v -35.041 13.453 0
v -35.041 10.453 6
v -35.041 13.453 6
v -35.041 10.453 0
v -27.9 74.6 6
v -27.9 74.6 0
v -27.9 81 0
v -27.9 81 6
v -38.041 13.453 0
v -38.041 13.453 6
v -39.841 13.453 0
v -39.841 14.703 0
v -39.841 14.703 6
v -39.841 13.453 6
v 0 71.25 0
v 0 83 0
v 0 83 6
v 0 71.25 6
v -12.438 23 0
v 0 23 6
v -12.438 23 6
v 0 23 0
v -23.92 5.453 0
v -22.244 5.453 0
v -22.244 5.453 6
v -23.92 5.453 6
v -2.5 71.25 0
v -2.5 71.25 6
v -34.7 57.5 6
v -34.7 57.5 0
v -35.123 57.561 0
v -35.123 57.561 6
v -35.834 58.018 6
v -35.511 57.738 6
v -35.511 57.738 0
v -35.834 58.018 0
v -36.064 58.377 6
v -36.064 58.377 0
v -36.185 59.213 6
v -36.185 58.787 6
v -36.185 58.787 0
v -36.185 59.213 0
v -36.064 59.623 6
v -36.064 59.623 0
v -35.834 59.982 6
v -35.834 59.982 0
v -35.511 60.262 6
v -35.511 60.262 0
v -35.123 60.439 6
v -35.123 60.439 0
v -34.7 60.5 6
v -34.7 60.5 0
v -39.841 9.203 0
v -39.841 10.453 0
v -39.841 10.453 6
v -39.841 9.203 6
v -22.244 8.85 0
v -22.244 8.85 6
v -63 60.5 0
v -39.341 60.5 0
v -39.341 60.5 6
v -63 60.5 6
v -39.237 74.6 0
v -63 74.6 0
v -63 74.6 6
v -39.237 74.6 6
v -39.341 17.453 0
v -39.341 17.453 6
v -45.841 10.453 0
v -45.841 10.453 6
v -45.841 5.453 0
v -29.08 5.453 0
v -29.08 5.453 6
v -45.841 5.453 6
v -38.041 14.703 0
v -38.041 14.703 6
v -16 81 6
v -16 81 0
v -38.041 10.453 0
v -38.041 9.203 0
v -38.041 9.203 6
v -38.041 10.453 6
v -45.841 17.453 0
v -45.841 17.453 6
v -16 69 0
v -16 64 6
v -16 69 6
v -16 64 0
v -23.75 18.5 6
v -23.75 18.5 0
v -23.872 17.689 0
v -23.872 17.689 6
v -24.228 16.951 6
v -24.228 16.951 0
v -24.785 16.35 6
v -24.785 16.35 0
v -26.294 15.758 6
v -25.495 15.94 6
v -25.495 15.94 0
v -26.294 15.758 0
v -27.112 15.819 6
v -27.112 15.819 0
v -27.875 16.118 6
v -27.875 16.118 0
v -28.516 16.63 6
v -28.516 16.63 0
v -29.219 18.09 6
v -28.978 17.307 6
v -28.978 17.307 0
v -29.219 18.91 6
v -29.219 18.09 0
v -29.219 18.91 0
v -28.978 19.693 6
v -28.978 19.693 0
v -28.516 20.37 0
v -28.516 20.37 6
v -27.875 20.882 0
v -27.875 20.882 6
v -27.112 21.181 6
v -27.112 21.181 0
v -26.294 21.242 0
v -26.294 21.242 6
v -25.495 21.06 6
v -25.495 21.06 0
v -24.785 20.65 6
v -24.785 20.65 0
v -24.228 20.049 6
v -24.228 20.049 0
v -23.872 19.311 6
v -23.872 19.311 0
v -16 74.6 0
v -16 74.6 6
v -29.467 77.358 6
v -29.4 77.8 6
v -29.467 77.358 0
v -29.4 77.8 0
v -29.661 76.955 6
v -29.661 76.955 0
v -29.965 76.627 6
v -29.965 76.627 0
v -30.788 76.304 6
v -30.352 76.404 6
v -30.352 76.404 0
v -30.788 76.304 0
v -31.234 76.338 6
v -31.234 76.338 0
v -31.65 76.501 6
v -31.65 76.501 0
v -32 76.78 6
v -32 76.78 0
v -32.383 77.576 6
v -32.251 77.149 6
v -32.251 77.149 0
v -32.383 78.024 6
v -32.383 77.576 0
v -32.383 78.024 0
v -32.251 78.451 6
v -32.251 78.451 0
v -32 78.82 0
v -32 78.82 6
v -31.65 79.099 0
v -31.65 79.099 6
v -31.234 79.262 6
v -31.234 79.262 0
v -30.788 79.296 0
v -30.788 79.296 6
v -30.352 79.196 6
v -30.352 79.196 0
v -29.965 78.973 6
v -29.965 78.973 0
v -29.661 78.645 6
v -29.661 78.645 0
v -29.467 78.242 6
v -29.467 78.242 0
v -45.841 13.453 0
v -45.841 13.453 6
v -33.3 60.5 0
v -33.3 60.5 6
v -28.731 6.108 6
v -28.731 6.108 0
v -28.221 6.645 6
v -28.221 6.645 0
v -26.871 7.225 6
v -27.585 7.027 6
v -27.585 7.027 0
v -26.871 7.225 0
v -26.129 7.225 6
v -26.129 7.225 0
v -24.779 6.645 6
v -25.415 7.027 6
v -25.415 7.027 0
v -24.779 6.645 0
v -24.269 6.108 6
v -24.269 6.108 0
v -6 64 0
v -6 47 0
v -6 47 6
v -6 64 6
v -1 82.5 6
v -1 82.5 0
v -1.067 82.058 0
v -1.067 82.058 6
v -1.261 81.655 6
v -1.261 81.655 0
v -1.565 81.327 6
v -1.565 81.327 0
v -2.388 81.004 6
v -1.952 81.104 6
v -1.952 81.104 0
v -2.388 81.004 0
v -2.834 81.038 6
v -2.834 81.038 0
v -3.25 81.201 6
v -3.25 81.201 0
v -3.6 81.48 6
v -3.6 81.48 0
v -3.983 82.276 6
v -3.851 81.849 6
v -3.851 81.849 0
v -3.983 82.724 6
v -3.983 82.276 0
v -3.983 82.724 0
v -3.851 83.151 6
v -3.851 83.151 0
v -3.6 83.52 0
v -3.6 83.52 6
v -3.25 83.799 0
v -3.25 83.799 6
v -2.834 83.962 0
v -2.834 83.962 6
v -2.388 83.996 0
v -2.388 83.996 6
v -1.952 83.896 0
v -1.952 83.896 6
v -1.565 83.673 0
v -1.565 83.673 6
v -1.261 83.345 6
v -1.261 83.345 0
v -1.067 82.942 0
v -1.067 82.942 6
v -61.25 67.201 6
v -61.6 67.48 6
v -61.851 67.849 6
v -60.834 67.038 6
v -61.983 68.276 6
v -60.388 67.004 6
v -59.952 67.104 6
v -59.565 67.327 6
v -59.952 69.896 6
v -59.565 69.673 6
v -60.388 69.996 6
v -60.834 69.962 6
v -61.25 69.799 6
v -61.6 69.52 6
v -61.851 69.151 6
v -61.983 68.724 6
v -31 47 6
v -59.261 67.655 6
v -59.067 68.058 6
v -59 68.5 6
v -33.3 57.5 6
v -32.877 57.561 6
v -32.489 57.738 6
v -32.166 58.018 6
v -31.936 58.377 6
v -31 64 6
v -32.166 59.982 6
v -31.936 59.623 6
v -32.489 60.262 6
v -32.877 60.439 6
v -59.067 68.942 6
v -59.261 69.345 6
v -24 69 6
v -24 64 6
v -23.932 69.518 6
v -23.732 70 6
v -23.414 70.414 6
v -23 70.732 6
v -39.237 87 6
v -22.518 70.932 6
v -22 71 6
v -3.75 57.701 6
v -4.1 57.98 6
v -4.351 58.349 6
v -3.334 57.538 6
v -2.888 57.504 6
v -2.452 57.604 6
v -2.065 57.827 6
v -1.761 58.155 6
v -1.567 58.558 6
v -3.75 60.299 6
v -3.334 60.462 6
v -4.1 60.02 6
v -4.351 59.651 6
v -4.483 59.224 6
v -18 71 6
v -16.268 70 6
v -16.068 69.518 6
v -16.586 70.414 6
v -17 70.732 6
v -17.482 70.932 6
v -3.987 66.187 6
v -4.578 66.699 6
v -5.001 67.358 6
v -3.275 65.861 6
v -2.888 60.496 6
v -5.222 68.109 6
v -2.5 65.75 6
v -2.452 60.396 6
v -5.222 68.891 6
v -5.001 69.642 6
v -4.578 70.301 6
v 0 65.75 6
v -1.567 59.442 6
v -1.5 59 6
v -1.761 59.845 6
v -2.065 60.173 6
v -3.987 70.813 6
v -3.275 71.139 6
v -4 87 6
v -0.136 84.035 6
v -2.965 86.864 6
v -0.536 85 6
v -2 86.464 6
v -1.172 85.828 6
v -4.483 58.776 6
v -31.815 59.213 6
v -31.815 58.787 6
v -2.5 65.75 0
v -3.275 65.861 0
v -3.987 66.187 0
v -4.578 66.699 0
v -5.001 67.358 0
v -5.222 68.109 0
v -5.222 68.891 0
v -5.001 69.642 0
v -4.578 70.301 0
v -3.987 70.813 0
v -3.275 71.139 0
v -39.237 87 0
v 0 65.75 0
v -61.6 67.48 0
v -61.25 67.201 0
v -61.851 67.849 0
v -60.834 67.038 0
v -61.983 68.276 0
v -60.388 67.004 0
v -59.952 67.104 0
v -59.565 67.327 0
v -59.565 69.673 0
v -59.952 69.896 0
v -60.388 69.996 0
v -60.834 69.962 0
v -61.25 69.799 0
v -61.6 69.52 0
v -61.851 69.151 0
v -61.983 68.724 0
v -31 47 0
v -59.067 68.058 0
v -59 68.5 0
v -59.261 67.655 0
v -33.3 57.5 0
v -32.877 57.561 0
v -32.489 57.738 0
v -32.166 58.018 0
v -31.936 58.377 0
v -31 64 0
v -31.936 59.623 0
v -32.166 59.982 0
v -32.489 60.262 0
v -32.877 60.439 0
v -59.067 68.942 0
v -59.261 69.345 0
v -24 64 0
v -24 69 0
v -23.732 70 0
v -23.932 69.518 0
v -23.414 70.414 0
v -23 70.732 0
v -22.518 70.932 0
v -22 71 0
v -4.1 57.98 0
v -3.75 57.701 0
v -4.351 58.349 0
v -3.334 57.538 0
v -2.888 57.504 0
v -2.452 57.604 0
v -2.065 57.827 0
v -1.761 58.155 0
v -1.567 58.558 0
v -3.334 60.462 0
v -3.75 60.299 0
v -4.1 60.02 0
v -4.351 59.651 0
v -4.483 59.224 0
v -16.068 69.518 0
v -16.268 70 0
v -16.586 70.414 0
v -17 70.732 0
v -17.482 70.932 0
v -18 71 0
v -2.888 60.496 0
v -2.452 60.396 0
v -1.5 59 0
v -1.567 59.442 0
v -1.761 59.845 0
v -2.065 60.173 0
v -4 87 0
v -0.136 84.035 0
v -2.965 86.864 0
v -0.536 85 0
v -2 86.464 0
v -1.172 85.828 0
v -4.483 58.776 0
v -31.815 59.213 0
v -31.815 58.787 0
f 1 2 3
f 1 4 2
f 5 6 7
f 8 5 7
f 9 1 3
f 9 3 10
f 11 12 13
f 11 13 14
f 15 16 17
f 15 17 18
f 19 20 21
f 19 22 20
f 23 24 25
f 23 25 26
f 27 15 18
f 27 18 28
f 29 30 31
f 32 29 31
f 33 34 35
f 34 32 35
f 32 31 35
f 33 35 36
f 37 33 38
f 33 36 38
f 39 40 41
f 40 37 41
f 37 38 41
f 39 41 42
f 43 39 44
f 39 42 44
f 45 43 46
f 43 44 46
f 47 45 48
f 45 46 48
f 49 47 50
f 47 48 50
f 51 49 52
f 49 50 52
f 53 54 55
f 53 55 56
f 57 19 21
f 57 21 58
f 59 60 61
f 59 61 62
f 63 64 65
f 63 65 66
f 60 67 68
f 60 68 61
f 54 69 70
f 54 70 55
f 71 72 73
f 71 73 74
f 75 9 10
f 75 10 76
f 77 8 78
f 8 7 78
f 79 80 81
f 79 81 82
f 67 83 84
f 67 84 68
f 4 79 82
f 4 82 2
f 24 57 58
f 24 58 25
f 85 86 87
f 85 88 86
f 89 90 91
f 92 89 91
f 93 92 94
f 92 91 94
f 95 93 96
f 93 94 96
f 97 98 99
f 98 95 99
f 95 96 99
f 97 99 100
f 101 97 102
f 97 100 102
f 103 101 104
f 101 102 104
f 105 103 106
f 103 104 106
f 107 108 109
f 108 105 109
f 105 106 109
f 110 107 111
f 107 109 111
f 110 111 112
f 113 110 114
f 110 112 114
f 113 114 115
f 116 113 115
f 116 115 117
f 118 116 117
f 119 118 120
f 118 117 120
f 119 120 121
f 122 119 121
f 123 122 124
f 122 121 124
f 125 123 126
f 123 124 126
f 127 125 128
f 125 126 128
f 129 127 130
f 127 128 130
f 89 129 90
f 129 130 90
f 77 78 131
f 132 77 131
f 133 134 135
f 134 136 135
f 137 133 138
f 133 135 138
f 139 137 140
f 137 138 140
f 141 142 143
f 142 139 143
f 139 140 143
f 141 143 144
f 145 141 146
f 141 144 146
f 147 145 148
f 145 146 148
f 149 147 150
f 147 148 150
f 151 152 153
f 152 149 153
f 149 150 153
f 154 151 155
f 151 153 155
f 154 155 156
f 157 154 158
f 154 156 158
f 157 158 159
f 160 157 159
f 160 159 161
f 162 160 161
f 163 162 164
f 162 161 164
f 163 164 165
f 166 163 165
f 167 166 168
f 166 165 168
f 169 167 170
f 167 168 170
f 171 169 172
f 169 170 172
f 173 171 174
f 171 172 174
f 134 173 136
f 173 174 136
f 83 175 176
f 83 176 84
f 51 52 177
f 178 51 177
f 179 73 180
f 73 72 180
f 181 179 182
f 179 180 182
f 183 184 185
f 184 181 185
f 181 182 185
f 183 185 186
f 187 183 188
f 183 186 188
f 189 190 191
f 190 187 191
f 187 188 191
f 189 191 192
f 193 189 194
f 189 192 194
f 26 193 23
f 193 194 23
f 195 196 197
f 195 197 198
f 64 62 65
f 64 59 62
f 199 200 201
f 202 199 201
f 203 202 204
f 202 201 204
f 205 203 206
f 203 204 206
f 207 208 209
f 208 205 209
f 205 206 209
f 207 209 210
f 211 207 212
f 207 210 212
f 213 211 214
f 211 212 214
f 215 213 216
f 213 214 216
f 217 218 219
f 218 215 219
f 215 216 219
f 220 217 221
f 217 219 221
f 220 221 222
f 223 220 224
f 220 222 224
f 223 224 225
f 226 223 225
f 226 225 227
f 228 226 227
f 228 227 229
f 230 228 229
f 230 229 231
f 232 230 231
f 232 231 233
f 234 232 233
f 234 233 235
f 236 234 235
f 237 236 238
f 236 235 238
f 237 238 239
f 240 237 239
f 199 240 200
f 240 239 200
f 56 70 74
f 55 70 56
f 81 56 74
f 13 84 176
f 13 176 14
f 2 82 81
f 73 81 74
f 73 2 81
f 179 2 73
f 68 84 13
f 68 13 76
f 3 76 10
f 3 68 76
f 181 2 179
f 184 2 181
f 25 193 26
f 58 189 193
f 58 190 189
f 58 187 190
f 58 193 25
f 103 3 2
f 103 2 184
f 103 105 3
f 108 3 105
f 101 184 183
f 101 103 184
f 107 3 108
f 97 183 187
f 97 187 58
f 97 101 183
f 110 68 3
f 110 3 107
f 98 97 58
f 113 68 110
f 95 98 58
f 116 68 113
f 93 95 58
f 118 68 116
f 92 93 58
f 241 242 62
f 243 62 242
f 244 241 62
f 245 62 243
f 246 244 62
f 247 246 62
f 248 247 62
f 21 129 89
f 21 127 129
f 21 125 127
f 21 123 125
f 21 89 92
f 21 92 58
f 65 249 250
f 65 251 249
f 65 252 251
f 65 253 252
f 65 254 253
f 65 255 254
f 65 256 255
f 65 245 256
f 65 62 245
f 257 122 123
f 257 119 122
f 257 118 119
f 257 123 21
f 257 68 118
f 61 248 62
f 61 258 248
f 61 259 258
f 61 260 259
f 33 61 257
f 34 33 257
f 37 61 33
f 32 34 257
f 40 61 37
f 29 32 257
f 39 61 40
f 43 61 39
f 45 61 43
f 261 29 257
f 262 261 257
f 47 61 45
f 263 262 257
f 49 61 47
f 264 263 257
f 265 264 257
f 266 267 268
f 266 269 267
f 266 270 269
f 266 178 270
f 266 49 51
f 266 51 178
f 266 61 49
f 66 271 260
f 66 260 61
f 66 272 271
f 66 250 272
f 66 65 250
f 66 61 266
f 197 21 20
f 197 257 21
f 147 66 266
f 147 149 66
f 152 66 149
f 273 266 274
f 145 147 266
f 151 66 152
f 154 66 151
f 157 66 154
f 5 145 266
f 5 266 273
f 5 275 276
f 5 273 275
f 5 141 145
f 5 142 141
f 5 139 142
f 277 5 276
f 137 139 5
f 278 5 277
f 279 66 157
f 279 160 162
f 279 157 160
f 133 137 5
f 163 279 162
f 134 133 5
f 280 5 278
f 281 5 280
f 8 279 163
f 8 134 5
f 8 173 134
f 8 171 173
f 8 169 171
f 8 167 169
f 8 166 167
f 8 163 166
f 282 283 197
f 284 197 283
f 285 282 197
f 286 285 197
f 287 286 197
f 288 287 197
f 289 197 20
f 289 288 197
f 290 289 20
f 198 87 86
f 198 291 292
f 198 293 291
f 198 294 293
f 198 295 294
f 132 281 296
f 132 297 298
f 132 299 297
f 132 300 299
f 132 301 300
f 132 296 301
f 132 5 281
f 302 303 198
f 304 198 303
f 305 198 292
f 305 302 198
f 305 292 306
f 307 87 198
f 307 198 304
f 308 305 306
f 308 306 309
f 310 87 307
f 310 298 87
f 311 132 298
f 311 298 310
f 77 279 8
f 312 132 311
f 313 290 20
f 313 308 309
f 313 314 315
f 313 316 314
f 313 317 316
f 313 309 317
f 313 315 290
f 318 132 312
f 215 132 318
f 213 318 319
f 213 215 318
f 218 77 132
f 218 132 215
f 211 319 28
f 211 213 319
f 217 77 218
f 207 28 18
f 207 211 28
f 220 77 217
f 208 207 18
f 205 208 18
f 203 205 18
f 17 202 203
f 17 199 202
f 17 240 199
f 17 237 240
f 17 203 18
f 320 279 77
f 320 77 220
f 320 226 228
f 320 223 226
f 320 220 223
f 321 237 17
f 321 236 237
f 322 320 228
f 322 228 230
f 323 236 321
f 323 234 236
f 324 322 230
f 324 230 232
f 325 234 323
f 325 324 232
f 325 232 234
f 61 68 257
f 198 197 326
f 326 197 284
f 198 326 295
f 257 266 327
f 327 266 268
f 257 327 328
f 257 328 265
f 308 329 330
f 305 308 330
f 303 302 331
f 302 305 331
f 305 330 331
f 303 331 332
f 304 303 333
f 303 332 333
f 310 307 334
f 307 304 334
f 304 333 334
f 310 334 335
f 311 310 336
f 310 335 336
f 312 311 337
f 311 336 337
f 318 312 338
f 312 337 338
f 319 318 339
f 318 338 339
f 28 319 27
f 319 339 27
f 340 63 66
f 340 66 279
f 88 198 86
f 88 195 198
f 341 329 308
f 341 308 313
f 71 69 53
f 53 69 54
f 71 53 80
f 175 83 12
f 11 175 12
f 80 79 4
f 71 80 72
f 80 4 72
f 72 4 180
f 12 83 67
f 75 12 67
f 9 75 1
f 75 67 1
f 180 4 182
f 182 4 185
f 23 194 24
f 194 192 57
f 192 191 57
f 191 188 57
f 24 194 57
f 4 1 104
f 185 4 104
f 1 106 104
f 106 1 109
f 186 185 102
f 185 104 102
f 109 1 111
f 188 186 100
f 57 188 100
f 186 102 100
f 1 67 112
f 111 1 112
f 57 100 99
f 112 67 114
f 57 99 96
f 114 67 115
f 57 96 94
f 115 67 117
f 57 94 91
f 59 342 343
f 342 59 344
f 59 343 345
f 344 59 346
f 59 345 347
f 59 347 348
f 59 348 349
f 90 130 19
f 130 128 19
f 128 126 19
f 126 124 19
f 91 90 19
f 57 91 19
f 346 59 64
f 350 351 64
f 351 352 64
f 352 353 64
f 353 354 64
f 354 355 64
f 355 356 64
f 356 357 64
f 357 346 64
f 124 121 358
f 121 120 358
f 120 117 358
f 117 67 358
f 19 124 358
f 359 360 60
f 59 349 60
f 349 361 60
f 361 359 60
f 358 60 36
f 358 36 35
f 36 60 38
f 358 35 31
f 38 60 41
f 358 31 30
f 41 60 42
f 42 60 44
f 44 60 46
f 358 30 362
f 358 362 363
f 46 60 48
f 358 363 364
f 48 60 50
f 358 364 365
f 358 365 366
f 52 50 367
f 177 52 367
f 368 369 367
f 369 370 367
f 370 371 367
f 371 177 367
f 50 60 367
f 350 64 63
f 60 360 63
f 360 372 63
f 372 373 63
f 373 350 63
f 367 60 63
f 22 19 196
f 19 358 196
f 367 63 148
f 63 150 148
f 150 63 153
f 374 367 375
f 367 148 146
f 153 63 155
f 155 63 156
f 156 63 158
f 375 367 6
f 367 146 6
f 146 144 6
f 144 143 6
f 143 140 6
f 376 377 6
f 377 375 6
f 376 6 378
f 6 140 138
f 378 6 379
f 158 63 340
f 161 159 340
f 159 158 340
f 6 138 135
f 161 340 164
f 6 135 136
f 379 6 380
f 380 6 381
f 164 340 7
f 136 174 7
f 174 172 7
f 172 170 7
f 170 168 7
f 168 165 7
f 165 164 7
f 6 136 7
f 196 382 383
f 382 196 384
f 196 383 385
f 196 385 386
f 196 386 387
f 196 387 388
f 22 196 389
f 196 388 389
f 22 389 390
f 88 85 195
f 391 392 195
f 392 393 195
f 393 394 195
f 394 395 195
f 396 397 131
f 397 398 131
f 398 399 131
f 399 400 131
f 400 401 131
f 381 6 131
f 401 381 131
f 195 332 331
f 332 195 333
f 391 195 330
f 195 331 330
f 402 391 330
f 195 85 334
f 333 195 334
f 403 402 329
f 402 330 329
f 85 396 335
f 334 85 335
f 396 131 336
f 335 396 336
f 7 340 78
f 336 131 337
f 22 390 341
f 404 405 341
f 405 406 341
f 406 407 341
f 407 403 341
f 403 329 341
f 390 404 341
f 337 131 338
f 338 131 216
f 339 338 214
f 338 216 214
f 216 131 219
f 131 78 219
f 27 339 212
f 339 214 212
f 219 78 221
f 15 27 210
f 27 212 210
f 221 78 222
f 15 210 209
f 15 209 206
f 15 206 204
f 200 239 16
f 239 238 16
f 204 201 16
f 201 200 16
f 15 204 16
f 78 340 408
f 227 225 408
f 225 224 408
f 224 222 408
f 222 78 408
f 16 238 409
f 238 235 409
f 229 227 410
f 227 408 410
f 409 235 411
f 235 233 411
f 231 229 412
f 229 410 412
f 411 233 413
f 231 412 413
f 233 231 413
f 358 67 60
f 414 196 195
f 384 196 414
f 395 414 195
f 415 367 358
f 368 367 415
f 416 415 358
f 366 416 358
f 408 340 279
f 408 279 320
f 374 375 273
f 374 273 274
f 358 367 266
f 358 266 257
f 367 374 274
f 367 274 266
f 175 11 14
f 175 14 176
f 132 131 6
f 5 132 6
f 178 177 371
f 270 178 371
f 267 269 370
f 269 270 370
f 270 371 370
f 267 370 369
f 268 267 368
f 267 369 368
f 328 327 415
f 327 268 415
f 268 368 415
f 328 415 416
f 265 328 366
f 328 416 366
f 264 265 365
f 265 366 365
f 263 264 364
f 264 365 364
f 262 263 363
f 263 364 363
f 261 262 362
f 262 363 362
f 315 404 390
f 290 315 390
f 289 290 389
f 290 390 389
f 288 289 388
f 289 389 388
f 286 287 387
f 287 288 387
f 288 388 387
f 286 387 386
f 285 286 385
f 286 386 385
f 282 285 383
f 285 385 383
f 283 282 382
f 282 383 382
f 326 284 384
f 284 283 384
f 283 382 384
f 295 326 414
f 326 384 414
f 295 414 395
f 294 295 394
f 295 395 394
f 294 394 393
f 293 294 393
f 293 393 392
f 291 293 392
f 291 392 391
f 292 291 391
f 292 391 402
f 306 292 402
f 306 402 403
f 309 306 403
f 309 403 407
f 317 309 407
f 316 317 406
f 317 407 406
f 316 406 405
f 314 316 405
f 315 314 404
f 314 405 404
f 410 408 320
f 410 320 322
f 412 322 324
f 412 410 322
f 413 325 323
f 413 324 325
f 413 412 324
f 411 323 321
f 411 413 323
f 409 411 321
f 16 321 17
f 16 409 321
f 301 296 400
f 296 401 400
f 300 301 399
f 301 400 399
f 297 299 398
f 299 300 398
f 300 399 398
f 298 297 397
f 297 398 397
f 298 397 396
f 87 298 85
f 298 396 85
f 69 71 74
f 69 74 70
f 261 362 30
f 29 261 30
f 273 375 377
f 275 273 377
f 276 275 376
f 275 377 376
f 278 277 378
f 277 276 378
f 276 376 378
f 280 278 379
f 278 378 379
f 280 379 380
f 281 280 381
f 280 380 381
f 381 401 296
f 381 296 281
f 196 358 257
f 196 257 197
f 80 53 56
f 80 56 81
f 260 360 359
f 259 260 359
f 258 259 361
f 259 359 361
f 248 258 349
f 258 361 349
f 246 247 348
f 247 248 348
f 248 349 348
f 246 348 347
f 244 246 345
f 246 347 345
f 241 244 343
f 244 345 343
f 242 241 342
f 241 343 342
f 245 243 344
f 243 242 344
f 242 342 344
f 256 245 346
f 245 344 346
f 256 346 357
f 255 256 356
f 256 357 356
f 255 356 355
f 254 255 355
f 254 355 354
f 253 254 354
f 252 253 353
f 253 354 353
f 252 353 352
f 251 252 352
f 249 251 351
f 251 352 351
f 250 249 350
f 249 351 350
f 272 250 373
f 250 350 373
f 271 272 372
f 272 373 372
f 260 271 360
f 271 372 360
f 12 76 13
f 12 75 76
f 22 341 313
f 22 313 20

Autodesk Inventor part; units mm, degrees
ref_plane "YZ Plane" through (0, 0, 0) normal (1, 0, 0) x (0, 1, 0)
ref_plane "XZ Plane" through (0, 0, 0) normal (0, 1, 0) x (-1, 0, 0)
ref_plane "XY Plane" through (0, 0, 0) normal (0, 0, 1) x (1, 0, 0)
sketch "Sketch1" plane through (0, 0, 0) normal (0, 0, 1) x (1, 0, 0)
  arc A0 (0, 83) -> (-4, 87) centre (-4, 83) ccw
  line L0 (-39.2369, 87) -> (-4, 87)
  line L1 (-39.2369, 74.6) -> (-39.2369, 87)
  line L2 (-63, 74.6) -> (-39.2369, 74.6)
  line L3 (-63, 60.5) -> (-63, 74.6)
  line L4 (-39.3408, 60.5) -> (-63, 60.5)
  line L5 (-39.3408, 17.4533) -> (-39.3408, 60.5)
  line L6 (-45.8408, 17.4533) -> (-39.3408, 17.4533)
  line L7 (-45.8408, 13.4533) -> (-45.8408, 17.4533)
  line L8 (-39.8408, 13.4533) -> (-45.8408, 13.4533)
  line L9 (-39.8408, 14.7033) -> (-39.8408, 13.4533)
  line L10 (-38.0408, 14.7033) -> (-39.8408, 14.7033)
  line L11 (-38.0408, 13.4533) -> (-38.0408, 14.7033)
  line L12 (-35.0408, 13.4533) -> (-38.0408, 13.4533)
  line L13 (-35.0408, 10.4533) -> (-35.0408, 13.4533)
  line L14 (-38.0408, 10.4533) -> (-35.0408, 10.4533)
  line L15 (-38.0408, 9.2033) -> (-38.0408, 10.4533)
  line L16 (-39.8408, 9.2033) -> (-38.0408, 9.2033)
  line L17 (-39.8408, 10.4533) -> (-39.8408, 9.2033)
  line L18 (-45.8408, 10.4533) -> (-39.8408, 10.4533)
  line L19 (-45.8408, 5.4533) -> (-45.8408, 10.4533)
  line L20 (-29.0795, 5.4533) -> (-45.8408, 5.4533)
  arc A1 (-23.9205, 5.4533) -> (-29.0795, 5.4533) centre (-26.5, 4.5) ccw
  line L21 (-22.2439, 5.4533) -> (-23.9205, 5.4533)
  line L22 (-22.2439, 8.8497) -> (-22.2439, 5.4533)
  line L23 (-12.4378, 23) -> (-22.2439, 8.8497)
  line L24 (0, 23) -> (-12.4378, 23)
  line L25 (0, 65.75) -> (0, 23)
  line L26 (-2.5, 65.75) -> (0, 65.75)
  arc A2 (-2.5, 71.25) -> (-2.5, 65.75) centre (-2.5, 68.5) ccw
  line L27 (0, 71.25) -> (-2.5, 71.25)
  line L28 (0, 83) -> (0, 71.25)
  line L29 (-27.9, 74.6) -> (-27.9, 81)
  line L30 (-27.9, 81) -> (-16, 81)
  line L31 (-16, 81) -> (-16, 74.6)
  line L32 (-16, 74.6) -> (-27.9, 74.6)
  circle A3 centre (-26.5, 18.5) radius 2.75
  line L33 (-34.7, 60.5) -> (-33.3, 60.5)
  arc A4 (-33.3, 57.5) -> (-33.3, 60.5) centre (-33.3, 59) ccw
  line L34 (-33.3, 57.5) -> (-34.7, 57.5)
  arc A5 (-34.7, 60.5) -> (-34.7, 57.5) centre (-34.7, 59) ccw
  circle A6 centre (-30.9, 77.8) radius 1.5
  circle A7 centre (-3, 59) radius 1.5
  circle A8 centre (-2.5, 82.5) radius 1.5
  circle A9 centre (-60.5, 68.5) radius 1.5
  line L35 (-31, 64) -> (-31, 47)
  line L36 (-24, 64) -> (-31, 64)
  line L37 (-24, 69) -> (-24, 64)
  arc A10 (-22, 71) -> (-24, 69) centre (-22, 69) ccw
  line L38 (-18, 71) -> (-22, 71)
  arc A11 (-16, 69) -> (-18, 71) centre (-18, 69) ccw
  line L39 (-16, 64) -> (-16, 69)
  line L40 (-6, 64) -> (-16, 64)
  line L41 (-6, 47) -> (-6, 64)
  line L42 (-31, 47) -> (-6, 47)
  point P0 (0, 0)
extrude "Extrusion1" add sketch "Sketch1" along normal blind 6
properties part number "yCarTopper"
